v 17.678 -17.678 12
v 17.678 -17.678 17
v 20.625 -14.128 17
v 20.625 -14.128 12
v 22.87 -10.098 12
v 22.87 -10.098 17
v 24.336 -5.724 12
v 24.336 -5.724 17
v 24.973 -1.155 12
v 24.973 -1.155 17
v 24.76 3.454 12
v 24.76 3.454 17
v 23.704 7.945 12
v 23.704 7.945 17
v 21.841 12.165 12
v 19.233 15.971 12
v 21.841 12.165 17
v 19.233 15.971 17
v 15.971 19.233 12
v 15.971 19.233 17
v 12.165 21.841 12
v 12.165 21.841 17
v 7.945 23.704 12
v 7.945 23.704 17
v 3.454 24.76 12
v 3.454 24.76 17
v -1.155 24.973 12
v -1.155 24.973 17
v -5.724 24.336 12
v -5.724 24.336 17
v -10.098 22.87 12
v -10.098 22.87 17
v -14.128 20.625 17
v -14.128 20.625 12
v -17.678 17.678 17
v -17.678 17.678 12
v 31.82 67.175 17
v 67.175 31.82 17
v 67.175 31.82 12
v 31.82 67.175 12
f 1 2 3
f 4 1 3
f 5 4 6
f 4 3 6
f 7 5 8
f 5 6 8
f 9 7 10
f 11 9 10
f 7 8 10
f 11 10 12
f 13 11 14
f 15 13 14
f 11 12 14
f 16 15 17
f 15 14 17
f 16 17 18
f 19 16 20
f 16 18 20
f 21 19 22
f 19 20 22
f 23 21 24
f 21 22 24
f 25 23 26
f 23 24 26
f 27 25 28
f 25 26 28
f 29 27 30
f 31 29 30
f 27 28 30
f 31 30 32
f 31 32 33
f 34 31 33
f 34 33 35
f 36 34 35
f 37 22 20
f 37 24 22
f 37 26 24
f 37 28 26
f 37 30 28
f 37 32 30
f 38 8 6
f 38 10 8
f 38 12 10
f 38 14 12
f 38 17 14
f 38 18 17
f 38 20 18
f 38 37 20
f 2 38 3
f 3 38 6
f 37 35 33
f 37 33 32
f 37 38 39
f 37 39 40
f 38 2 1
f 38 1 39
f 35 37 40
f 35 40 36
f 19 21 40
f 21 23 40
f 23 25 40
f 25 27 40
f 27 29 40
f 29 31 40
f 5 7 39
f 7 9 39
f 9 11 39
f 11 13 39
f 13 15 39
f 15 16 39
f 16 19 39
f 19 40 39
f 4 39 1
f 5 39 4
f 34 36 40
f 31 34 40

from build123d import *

# Parameters (mm, degrees)
SKETCH010_AS_DRAWN_R                      = 3
EXTRUDE009_DEPTH                          = 40
EXTRUDE009_ONTO_SKETCH010_PLACEMENT_ANGLE = 9
EXTRUDE001_DEPTH                          = 5
EXTRUDE001_PLACEMENT_ANGLE                = 45


with BuildPart() as extrude009:
    # Sketch010 as drawn → Extrude009 (new)
    with BuildSketch(Plane.XY):
        Circle(SKETCH010_AS_DRAWN_R)
    extrude(amount=-EXTRUDE009_DEPTH)


with BuildPart() as extrude009_1:
    # Extrude009 onto Sketch010 placement: moved
    add(extrude009.part.moved(Location((-32, -32, 30))).rotate(Axis((-32, -32, 30), (0, 0, -1)), EXTRUDE009_ONTO_SKETCH010_PLACEMENT_ANGLE))


with BuildPart() as cut003:
    # Sketch001 (on Face7 of Extrude) → Extrude001 (new body)
    with BuildSketch(Plane.XY.offset(17)):
        with BuildLine():
            Line((25, 0), (25, 70))
            Line((25, 70), (-25, 70))
            Line((-25, 70), (-25, 0))
            ThreePointArc((25, 0), (0, 25), (-25, 0))
        make_face()
    extrude(amount=-EXTRUDE001_DEPTH)


with BuildPart() as cut003_1:
    # Extrude001 placement: moved
    add(cut003.part.rotate(Axis((0, 0, 0), (0, 0, -1)), EXTRUDE001_PLACEMENT_ANGLE))

    # Cut003: cut Extrude009
    add(extrude009_1.part, mode=Mode.SUBTRACT)


solid = cut003_1.part
